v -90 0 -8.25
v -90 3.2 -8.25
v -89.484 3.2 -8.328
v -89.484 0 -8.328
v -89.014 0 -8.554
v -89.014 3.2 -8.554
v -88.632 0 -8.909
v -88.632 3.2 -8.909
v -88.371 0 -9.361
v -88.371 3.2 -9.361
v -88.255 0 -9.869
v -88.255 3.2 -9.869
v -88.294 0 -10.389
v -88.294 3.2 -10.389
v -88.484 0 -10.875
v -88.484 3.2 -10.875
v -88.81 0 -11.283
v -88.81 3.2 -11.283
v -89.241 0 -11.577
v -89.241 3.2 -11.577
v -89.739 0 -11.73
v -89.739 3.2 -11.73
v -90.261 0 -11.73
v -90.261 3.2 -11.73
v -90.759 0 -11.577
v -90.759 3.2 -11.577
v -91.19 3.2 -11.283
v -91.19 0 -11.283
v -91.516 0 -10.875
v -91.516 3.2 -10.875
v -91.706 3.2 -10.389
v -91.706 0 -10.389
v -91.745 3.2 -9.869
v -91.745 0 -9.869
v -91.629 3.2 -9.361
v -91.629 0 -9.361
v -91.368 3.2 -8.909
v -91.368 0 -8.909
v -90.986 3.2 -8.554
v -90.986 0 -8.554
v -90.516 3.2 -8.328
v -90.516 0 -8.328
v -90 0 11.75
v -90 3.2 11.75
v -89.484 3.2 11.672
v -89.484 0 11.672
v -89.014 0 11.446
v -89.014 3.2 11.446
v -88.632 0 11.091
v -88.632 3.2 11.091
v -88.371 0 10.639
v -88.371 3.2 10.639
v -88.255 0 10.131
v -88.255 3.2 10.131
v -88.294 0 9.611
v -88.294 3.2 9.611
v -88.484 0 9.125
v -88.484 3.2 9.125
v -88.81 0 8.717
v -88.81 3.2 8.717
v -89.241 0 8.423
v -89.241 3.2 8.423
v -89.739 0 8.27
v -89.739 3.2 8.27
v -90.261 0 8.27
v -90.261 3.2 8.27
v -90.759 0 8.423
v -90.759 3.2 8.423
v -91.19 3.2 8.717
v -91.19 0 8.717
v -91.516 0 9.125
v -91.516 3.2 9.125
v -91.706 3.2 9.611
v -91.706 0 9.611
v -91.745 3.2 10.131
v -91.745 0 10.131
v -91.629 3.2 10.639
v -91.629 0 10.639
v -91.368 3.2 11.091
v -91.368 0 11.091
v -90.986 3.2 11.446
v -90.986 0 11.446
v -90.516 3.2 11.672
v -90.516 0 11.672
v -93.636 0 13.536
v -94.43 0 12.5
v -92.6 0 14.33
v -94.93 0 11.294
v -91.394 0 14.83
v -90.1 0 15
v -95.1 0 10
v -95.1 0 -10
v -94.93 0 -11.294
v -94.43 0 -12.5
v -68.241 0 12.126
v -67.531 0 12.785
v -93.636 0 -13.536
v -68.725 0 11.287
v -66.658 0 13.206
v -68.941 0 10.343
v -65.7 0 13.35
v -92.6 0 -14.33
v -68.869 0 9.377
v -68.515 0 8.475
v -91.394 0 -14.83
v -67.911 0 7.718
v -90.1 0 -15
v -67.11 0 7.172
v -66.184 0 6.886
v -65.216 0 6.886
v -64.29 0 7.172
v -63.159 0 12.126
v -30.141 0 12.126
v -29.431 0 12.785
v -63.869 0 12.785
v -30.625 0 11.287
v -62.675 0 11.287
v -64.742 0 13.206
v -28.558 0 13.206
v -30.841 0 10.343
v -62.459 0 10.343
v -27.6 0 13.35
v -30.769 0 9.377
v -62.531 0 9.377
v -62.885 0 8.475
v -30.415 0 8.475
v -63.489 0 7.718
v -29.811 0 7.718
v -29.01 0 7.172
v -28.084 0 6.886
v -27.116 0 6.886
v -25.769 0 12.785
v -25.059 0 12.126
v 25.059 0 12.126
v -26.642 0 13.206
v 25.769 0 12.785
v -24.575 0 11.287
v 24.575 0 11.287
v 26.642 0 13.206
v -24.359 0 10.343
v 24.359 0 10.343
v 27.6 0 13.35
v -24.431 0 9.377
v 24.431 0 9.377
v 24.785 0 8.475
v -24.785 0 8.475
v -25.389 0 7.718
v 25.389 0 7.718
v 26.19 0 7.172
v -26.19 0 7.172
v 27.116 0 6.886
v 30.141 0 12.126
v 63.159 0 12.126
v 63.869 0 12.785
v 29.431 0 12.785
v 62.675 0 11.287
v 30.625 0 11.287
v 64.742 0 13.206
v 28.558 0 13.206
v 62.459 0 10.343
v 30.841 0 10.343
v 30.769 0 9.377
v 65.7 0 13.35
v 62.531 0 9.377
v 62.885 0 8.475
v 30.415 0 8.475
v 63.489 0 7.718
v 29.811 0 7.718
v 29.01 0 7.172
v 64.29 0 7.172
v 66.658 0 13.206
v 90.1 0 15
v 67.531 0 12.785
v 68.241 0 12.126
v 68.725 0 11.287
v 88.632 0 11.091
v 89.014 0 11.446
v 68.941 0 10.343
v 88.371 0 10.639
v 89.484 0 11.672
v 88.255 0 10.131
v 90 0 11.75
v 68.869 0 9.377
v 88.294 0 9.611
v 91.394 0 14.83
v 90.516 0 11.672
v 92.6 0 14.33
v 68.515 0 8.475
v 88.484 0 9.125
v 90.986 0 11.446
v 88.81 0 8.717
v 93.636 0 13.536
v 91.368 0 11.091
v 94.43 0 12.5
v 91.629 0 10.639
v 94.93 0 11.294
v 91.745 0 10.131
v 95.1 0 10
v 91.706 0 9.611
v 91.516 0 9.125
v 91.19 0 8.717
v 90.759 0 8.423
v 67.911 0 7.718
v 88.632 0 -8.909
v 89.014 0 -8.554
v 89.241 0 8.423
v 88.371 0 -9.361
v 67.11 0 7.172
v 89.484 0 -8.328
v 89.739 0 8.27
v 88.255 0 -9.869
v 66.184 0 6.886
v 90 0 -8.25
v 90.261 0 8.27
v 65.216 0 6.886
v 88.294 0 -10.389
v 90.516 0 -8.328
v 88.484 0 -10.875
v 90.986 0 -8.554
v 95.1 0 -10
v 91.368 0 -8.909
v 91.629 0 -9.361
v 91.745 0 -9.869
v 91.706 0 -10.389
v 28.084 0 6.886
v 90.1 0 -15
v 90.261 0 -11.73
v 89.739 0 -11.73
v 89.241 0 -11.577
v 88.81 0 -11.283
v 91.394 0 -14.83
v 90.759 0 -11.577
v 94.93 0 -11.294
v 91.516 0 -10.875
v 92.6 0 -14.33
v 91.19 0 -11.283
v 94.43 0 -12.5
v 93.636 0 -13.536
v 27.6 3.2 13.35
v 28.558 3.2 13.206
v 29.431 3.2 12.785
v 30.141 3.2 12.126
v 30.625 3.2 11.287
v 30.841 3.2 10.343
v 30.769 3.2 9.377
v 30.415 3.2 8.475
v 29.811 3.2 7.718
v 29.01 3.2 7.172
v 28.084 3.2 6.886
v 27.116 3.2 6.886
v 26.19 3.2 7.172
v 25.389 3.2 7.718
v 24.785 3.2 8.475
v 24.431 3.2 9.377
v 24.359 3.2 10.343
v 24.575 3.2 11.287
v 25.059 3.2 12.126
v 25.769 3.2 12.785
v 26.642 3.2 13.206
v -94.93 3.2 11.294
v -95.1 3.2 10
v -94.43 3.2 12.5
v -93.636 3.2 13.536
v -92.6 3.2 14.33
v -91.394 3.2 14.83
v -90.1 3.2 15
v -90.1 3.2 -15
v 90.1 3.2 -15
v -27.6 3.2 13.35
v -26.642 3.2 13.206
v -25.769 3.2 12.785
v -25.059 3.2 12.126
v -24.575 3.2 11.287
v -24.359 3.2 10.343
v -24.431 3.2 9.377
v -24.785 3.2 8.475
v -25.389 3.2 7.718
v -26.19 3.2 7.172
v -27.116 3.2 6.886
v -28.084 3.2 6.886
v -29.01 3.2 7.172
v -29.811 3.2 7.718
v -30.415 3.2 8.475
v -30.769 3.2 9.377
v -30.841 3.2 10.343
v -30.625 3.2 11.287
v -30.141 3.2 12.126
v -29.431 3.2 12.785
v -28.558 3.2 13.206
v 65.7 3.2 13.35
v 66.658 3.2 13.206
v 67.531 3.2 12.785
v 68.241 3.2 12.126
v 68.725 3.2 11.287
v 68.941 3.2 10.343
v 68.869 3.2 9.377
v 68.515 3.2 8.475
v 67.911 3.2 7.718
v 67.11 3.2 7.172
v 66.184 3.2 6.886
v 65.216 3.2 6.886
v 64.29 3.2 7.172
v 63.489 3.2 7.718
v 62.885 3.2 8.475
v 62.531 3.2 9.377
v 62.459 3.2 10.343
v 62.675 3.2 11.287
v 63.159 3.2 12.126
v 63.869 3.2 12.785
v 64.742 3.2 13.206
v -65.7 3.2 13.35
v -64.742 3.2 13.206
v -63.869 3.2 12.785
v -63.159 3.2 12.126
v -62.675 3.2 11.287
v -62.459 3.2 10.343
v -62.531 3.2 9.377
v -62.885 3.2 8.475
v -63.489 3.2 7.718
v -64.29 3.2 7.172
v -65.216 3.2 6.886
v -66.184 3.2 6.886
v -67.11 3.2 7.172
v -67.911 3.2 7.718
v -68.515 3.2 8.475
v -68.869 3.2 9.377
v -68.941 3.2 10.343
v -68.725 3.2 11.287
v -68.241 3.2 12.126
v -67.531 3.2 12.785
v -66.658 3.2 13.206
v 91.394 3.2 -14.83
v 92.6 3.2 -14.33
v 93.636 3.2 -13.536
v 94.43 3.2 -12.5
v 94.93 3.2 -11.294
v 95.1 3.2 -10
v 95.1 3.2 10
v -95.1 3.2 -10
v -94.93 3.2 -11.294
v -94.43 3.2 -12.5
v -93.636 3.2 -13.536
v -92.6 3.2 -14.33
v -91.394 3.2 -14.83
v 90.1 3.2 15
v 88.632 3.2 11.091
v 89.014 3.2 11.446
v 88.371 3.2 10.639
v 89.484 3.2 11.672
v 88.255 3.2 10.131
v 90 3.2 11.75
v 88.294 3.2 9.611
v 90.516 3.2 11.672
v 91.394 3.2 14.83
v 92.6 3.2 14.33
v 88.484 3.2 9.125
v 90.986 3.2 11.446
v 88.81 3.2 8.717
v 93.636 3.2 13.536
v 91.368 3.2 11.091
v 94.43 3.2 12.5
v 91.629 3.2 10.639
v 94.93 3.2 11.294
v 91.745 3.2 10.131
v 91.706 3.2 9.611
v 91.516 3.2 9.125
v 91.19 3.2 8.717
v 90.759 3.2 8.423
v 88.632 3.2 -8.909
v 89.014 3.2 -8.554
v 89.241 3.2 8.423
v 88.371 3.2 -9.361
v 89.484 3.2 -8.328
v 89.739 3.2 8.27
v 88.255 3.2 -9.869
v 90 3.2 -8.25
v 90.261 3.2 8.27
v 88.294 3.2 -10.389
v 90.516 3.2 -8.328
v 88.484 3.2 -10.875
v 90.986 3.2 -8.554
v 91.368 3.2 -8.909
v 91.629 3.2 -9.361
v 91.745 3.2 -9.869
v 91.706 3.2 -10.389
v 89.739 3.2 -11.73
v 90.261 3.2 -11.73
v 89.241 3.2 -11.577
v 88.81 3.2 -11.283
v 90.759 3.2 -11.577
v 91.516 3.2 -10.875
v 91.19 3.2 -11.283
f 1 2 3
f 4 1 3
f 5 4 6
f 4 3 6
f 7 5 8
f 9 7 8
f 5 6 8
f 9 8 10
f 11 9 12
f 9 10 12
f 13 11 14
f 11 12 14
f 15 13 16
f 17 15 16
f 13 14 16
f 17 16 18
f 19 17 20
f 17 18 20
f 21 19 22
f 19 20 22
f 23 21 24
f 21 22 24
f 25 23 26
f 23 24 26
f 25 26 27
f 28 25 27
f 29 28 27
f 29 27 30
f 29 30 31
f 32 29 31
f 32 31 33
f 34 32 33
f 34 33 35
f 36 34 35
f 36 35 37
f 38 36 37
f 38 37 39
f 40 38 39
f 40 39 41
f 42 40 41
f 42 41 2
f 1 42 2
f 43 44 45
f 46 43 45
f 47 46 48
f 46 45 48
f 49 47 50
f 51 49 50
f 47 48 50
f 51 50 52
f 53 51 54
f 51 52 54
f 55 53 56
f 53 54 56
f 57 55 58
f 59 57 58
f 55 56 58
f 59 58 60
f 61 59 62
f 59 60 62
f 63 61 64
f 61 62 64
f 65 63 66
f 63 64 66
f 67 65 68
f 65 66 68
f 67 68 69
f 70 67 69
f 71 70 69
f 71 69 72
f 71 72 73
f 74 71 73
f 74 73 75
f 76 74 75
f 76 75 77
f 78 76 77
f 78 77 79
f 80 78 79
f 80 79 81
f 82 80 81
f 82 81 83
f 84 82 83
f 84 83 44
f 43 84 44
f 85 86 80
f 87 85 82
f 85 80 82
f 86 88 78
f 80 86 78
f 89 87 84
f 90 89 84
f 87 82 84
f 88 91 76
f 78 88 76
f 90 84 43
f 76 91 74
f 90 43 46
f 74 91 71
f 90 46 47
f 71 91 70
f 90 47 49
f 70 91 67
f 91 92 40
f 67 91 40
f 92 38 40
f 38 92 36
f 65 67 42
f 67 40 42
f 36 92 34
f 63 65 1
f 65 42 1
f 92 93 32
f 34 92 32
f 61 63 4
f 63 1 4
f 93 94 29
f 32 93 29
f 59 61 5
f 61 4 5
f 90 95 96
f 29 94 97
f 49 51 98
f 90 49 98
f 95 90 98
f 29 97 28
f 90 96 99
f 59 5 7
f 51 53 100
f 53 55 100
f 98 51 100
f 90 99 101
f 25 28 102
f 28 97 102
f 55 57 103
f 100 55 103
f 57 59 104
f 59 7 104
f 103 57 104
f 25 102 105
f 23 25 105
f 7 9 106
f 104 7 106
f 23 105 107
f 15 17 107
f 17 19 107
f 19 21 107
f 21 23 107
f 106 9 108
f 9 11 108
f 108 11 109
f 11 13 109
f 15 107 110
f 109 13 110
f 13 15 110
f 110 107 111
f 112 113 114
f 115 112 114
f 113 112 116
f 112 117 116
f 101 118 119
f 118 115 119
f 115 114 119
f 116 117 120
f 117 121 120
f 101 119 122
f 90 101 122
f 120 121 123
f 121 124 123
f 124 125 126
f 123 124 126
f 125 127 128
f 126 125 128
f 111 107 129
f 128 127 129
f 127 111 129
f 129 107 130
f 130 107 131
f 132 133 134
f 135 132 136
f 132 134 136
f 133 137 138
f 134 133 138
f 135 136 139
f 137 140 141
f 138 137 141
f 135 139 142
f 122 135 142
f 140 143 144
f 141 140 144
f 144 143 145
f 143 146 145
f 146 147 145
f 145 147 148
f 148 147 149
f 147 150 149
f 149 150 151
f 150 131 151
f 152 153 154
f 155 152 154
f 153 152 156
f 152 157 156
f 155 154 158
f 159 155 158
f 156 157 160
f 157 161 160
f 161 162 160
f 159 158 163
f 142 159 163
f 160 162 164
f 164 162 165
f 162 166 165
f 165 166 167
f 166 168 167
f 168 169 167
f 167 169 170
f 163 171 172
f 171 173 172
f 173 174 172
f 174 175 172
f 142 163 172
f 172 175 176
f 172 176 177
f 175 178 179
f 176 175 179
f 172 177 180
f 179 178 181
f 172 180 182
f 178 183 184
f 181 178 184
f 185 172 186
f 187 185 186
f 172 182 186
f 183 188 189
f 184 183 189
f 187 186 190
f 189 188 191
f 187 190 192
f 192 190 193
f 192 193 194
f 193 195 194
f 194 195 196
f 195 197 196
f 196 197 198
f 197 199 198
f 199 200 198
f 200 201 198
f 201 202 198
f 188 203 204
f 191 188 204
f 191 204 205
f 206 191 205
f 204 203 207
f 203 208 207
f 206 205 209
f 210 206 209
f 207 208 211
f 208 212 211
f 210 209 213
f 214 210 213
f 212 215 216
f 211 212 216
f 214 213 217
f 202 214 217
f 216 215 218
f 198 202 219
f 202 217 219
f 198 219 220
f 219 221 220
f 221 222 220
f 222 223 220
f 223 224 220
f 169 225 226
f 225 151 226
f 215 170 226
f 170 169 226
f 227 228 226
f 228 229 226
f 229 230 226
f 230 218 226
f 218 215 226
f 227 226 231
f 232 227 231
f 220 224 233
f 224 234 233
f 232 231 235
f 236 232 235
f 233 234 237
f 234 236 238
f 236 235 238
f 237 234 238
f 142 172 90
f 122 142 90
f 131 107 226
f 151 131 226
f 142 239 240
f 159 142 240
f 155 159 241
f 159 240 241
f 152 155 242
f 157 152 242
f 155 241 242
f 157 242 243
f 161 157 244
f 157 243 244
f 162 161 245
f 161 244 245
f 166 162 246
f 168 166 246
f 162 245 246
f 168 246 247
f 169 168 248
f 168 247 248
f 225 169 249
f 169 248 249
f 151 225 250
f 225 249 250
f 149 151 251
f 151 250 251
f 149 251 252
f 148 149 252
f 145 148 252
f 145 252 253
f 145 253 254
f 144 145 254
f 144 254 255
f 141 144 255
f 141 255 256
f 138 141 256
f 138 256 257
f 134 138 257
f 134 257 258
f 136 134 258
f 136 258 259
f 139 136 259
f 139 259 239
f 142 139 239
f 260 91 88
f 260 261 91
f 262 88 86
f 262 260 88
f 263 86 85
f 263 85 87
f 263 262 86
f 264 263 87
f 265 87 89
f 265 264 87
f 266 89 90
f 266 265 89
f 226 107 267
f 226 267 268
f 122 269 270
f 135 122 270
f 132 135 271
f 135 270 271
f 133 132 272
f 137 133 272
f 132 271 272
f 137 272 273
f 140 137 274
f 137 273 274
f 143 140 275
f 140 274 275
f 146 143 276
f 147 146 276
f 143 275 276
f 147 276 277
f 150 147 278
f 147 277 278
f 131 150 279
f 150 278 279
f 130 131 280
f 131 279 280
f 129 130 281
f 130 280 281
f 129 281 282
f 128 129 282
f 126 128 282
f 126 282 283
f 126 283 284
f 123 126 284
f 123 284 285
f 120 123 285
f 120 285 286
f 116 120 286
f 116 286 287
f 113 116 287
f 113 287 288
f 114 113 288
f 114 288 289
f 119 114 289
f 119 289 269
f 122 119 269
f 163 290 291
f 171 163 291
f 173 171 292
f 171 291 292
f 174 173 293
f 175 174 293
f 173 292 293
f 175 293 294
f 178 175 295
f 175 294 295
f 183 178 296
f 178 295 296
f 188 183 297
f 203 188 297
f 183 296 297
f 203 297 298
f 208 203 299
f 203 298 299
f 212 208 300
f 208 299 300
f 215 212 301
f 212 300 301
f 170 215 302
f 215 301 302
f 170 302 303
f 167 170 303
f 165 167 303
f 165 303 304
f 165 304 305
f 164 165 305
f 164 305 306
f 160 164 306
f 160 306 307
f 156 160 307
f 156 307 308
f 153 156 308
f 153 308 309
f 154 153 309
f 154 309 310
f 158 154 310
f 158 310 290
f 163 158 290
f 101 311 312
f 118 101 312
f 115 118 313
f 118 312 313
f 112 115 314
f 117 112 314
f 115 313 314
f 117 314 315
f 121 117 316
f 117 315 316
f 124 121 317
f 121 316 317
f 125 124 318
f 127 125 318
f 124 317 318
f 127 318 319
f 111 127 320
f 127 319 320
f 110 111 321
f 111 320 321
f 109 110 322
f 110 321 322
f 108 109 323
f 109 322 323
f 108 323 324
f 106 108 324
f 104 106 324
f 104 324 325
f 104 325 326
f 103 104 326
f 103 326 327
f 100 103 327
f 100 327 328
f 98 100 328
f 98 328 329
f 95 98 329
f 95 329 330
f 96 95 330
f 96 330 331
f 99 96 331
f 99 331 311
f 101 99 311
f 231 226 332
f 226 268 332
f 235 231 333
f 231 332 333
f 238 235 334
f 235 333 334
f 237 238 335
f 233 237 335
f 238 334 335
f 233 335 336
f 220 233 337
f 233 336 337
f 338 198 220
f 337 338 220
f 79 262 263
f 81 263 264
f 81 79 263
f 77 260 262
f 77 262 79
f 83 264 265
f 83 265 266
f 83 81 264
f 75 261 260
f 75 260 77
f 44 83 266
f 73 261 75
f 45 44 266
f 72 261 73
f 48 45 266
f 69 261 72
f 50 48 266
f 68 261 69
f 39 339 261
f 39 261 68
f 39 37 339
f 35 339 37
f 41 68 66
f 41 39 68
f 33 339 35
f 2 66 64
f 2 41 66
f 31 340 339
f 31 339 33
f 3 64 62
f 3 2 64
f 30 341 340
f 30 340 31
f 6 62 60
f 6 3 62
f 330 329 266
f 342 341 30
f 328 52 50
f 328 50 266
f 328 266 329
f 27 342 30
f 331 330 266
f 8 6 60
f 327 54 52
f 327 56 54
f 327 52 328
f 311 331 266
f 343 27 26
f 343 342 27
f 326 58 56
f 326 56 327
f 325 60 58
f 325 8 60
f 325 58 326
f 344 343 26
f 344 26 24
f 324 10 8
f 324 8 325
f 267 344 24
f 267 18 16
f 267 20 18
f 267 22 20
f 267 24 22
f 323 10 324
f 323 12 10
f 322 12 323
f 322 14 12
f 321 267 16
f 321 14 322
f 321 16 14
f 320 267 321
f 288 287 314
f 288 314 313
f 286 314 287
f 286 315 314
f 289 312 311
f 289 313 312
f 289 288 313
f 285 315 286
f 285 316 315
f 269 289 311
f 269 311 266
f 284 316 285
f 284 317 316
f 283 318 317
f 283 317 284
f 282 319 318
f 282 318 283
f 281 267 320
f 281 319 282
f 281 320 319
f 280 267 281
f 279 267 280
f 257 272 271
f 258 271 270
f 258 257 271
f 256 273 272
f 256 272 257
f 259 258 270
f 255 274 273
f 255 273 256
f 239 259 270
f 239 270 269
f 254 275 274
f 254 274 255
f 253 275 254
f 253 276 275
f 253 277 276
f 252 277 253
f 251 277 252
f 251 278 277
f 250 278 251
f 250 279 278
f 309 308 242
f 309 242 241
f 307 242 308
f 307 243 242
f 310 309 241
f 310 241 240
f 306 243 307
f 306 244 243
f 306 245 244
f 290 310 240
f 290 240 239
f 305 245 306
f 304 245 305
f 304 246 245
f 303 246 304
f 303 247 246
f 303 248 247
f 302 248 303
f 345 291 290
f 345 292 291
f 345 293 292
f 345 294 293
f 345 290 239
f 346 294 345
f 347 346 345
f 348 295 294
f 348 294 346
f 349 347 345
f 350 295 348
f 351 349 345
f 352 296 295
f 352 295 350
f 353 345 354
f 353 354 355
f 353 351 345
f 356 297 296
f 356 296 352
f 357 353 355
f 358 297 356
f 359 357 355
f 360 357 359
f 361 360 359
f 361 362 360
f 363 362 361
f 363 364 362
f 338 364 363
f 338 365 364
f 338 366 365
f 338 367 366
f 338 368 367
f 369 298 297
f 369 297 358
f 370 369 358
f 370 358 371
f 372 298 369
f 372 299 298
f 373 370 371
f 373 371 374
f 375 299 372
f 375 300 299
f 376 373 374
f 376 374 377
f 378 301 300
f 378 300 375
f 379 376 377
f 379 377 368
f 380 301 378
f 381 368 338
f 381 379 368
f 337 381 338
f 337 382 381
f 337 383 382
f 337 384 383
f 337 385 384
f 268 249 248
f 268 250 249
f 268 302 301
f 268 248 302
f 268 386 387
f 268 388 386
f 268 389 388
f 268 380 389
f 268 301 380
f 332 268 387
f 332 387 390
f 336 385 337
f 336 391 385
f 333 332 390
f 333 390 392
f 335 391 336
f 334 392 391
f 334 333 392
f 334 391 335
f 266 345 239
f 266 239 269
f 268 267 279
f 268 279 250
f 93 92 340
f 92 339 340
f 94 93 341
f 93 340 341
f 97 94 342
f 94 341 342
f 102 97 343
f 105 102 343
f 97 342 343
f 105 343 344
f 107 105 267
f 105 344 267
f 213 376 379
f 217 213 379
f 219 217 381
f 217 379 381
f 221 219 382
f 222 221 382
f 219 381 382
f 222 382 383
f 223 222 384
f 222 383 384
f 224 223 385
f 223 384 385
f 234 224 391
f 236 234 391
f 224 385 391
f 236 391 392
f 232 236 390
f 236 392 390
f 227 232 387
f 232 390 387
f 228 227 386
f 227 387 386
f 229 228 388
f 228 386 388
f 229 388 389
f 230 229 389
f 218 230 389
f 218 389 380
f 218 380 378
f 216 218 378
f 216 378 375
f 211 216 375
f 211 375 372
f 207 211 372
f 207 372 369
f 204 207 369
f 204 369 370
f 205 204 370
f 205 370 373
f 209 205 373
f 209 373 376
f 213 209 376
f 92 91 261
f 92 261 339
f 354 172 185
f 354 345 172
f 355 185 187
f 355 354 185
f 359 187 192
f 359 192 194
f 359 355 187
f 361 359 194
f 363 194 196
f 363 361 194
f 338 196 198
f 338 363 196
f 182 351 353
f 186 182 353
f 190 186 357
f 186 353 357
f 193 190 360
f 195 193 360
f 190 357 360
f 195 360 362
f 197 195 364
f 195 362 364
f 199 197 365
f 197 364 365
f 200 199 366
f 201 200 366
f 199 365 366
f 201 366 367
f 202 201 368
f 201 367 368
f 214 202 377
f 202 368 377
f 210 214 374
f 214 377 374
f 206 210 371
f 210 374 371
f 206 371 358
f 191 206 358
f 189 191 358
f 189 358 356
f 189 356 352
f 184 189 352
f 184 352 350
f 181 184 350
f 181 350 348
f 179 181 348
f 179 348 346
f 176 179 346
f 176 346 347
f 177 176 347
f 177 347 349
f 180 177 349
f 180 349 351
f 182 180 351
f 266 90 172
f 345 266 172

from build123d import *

# Parameters (mm, degrees)
SKETCH1_W           = 190.2
SKETCH1_H           = 30
BOSS_EXTRUDE1_DEPTH = 3.2
SKETCH2_R           = 1.75
CUT_EXTRUDE1_DEPTH  = 97.328863795
SKETCH3_R           = 3.25
CUT_EXTRUDE2_DEPTH  = 97.328863795
FILLET1_R           = 5


with BuildPart() as part:
    # Sketch1 → Boss-Extrude1 (new body)
    with BuildSketch(Plane(origin=(0, 0, 0), x_dir=(1, 0, 0), z_dir=(0, 1, 0))):
        Rectangle(SKETCH1_W, SKETCH1_H)
    extrude(amount=BOSS_EXTRUDE1_DEPTH)

    # Sketch2 → Cut-Extrude1 (cut, through all)
    with BuildSketch(Plane(origin=(0, 3.2, 0), x_dir=(1, 0, 0), z_dir=(0, 1, 0))):
        with Locations(Location((-90, 10, 0), (0, 0, 270))):
            Circle(SKETCH2_R)
        with Locations(Location((-90, -10, 0), (0, 0, 270))):
            Circle(SKETCH2_R)
        with Locations(Location((90, 10, 0), (0, 0, 270))):
            Circle(SKETCH2_R)
        with Locations(Location((90, -10, 0), (0, 0, 270))):
            Circle(SKETCH2_R)
    extrude(amount=-CUT_EXTRUDE1_DEPTH, mode=Mode.SUBTRACT)

    # Sketch3 → Cut-Extrude2 (cut, through all)
    with BuildSketch(Plane(origin=(0, 3.2, 0), x_dir=(1, 0, 0), z_dir=(0, 1, 0))):
        with Locations(Location((65.7, -10.1, 0), (0, 0, 270))):
            Circle(SKETCH3_R)
        with Locations(Location((27.6, -10.1, 0), (0, 0, 270))):
            Circle(SKETCH3_R)
        with Locations(Location((-27.6, -10.1, 0), (0, 0, 270))):
            Circle(SKETCH3_R)
        with Locations(Location((-65.7, -10.1, 0), (0, 0, 270))):
            Circle(SKETCH3_R)
    extrude(amount=-CUT_EXTRUDE2_DEPTH, mode=Mode.SUBTRACT)

    # Fillet1
    fillet1_edges = [part.edges().sort_by_distance(p)[0] for p in [
        (95.1, 1.6, 15),
        (-95.1, 1.6, 15),
        (-95.1, 1.6, -15),
        (95.1, 1.6, -15),
    ]]
    fillet(fillet1_edges, radius=FILLET1_R)


solid = part.part
